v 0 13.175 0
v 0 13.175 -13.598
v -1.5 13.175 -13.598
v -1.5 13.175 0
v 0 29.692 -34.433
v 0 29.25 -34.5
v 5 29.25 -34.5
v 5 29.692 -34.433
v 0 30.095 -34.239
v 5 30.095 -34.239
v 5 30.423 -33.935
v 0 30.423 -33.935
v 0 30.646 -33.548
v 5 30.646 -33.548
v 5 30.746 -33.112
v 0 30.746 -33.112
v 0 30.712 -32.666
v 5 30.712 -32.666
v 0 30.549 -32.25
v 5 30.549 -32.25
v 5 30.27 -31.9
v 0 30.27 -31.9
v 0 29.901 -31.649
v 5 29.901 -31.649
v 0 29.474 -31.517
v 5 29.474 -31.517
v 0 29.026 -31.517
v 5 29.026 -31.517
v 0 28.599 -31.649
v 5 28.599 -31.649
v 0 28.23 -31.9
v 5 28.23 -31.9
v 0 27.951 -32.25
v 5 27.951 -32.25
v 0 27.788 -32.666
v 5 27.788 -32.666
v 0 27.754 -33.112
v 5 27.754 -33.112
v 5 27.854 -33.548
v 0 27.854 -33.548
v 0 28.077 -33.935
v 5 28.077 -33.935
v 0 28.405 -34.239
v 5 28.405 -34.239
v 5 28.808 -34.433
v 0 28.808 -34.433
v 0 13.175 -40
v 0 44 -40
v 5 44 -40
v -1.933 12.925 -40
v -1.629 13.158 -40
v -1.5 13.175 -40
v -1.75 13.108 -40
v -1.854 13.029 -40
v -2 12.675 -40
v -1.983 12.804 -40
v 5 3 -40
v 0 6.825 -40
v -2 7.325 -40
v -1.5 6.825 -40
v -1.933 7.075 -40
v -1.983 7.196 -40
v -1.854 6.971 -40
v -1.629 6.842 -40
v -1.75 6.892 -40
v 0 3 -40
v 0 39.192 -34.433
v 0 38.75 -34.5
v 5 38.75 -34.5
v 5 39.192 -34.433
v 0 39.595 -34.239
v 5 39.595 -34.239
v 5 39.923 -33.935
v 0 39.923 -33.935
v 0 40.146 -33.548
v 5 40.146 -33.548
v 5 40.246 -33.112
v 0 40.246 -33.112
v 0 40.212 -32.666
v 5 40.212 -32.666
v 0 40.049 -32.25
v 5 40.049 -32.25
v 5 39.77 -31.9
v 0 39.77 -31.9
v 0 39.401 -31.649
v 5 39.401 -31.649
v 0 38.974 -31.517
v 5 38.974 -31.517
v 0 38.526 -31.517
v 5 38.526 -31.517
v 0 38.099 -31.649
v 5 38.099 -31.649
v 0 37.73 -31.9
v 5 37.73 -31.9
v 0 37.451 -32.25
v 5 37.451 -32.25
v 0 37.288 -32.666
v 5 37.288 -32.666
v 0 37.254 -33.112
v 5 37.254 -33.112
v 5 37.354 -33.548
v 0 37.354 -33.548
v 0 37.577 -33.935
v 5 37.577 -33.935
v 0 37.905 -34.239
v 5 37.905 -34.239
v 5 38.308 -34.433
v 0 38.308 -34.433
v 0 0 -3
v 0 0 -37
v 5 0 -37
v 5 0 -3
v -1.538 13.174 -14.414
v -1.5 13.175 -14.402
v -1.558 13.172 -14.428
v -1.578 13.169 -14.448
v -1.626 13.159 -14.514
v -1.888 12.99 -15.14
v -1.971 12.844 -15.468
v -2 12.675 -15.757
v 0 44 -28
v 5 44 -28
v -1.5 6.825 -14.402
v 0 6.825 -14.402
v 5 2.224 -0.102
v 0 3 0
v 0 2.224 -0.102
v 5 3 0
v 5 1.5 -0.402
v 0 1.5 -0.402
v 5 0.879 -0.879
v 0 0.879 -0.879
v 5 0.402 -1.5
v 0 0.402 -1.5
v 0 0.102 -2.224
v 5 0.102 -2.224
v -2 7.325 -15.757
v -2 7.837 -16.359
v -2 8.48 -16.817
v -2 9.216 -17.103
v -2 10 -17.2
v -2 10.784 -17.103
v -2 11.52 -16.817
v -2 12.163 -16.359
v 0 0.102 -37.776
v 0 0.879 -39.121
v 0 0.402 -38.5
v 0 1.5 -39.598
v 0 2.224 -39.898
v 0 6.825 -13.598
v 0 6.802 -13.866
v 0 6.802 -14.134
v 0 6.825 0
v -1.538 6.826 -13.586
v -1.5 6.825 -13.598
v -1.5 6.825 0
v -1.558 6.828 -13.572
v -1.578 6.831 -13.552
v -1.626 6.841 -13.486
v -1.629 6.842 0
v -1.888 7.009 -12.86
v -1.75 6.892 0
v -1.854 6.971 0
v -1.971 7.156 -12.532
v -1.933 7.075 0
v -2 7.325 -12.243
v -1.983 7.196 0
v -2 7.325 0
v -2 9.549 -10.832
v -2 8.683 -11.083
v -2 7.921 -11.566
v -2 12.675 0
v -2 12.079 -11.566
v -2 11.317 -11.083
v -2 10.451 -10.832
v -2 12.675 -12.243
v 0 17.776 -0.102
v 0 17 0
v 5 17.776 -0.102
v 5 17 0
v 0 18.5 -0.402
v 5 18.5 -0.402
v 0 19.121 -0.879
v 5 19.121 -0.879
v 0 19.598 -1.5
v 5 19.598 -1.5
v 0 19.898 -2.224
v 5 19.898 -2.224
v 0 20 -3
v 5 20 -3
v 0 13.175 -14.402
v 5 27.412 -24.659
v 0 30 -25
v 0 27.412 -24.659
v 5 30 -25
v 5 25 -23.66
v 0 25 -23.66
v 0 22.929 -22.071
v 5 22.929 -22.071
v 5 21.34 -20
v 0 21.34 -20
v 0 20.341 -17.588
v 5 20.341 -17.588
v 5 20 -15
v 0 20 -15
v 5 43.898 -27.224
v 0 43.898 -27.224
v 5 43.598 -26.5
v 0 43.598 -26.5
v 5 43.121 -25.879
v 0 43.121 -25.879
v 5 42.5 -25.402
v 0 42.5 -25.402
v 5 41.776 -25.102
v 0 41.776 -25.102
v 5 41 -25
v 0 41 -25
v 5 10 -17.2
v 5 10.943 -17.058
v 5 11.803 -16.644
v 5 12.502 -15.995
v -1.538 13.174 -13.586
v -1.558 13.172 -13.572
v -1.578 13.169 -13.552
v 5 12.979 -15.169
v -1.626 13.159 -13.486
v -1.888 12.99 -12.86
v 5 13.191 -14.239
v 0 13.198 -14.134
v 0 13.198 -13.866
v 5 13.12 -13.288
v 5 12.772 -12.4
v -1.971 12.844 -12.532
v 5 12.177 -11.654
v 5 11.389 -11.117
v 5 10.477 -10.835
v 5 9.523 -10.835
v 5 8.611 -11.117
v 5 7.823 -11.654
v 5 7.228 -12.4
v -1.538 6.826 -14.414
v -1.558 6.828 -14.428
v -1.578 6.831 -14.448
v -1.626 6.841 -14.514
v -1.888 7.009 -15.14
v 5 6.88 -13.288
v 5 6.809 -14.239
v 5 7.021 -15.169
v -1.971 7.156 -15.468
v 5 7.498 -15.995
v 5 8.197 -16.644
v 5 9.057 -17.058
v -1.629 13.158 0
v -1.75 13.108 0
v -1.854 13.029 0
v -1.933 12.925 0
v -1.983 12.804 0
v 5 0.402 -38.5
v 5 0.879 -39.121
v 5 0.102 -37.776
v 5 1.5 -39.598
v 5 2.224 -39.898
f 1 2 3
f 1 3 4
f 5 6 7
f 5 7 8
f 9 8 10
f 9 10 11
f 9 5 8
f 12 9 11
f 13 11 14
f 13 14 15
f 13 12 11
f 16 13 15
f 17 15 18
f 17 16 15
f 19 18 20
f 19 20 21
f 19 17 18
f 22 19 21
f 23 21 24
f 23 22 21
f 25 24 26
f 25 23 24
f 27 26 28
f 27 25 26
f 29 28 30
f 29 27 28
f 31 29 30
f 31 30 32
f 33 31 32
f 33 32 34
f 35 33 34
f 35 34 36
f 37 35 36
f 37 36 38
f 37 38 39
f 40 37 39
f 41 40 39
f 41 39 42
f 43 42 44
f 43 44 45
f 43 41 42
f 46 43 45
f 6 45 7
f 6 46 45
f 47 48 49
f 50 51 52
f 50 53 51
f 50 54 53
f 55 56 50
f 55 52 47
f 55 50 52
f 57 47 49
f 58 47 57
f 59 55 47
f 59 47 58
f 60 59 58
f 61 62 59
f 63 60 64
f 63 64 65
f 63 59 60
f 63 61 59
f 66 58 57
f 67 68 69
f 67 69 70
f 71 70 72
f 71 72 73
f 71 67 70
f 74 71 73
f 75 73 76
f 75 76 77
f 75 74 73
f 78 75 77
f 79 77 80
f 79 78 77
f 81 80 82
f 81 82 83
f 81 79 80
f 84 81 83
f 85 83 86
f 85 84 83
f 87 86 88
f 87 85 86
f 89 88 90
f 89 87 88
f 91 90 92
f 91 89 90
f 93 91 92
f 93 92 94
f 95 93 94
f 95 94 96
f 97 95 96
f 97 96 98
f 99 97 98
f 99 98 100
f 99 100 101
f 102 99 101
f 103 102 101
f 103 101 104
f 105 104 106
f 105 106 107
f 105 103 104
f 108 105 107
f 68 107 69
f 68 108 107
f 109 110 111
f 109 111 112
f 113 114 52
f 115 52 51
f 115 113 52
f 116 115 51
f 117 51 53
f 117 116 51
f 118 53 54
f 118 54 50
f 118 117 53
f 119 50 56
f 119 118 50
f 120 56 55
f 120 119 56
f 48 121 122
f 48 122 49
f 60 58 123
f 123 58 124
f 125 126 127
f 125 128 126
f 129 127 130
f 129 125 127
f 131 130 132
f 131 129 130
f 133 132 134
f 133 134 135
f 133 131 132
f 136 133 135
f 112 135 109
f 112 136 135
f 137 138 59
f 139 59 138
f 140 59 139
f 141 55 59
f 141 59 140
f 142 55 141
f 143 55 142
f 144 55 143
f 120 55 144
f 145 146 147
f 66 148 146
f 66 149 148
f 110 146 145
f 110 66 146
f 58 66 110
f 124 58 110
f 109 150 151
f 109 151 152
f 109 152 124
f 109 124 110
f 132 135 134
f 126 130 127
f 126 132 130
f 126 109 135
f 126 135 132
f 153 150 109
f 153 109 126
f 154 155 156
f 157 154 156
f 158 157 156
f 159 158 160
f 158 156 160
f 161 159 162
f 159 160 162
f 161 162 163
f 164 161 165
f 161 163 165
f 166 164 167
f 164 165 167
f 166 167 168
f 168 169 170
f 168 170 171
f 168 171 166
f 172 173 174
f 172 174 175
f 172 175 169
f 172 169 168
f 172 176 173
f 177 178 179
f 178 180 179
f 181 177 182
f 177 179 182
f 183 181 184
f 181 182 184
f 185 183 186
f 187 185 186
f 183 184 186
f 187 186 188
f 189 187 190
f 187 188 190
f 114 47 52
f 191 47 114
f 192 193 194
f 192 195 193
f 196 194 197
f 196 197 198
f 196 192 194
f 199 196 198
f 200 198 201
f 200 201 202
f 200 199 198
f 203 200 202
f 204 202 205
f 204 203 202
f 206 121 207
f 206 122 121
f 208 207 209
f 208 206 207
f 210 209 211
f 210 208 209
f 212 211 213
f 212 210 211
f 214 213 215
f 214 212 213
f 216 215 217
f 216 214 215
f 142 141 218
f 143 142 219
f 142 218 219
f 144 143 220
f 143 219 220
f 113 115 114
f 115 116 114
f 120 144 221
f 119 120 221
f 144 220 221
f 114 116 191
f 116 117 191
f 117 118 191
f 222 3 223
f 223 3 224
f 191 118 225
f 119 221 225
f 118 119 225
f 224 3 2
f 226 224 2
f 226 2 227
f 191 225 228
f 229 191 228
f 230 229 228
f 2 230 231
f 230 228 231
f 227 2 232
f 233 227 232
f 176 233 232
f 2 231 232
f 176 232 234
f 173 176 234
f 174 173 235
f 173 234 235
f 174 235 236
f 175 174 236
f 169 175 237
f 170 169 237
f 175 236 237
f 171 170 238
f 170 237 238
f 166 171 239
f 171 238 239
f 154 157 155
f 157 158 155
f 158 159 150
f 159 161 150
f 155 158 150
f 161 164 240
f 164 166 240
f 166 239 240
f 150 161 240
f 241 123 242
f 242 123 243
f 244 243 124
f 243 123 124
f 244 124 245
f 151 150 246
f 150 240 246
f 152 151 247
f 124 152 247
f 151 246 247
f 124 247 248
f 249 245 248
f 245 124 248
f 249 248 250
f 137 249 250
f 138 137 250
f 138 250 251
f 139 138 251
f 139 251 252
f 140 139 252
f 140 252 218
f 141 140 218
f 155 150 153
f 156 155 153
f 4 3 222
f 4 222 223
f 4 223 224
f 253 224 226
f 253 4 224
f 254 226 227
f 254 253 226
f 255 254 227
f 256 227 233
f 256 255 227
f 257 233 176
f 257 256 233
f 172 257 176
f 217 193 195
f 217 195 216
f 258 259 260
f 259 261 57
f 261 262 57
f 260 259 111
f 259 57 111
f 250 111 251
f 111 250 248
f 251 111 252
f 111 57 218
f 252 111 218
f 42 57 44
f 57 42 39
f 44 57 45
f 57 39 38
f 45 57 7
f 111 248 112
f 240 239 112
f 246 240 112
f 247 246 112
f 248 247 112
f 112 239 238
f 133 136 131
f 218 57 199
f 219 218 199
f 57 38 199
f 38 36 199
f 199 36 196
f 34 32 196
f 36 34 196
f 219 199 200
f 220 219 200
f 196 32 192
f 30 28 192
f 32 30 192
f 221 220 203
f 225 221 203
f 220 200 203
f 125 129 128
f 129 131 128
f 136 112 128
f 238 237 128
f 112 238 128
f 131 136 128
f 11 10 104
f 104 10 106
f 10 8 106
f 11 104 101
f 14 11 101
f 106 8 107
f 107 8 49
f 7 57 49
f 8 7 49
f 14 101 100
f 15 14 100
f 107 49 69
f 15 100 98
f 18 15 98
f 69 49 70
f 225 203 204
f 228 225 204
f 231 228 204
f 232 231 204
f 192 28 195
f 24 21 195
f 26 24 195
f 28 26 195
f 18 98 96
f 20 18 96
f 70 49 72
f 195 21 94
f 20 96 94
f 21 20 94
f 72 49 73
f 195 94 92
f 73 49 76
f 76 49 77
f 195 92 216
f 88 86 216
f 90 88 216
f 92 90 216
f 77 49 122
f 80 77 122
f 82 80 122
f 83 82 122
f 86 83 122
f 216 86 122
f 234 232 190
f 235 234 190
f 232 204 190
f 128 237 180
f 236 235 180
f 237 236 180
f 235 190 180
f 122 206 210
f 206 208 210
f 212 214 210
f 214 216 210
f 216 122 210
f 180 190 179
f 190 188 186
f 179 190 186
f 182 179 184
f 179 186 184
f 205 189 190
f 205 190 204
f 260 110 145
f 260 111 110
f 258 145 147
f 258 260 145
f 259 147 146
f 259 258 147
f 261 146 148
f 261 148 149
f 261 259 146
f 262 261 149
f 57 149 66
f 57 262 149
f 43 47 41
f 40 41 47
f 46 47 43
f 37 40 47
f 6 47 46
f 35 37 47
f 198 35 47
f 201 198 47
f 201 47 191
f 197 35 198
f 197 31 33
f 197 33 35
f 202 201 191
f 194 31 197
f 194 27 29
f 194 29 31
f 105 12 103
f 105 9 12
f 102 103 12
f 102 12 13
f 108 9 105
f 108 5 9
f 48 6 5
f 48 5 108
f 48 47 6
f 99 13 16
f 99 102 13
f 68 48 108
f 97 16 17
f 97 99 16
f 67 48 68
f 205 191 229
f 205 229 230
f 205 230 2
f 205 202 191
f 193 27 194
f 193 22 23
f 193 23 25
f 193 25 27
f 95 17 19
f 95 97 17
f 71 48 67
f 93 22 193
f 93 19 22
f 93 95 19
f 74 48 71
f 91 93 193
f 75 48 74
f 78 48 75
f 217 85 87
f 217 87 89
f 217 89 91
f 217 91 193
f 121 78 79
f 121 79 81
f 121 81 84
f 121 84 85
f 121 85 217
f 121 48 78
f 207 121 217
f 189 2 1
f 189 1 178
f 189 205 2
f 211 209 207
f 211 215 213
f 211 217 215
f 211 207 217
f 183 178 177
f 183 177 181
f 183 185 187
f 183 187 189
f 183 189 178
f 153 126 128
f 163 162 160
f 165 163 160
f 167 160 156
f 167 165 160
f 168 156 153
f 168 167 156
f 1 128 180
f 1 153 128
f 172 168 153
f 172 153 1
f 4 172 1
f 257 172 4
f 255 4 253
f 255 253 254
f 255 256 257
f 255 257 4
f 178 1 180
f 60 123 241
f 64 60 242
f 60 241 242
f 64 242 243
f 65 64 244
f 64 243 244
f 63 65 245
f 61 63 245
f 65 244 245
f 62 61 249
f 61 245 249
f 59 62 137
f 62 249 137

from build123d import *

# Parameters (mm, degrees)
SKETCH1_R           = 1.5
BOSS_EXTRUDE1_DEPTH = 5
SKETCH3_W           = 40
SKETCH3_H           = 6.35
BOSS_EXTRUDE2_DEPTH = 2
FILLET1_R           = 0.5
FILLET2_R           = 3
SKETCH4_R           = 3.2004
CUT_EXTRUDE1_DEPTH  = 8
FILLET3_R           = 10


with BuildPart() as part:
    # Sketch1 → Boss-Extrude1 (new body)
    with BuildSketch(Plane(origin=(0, 0, 0), x_dir=(0, 0, -1), z_dir=(1, 0, 0))):
        Polygon((0, 0), (0, 20), (25, 20), (25, 44), (40, 44), (40, 0), align=None)
        with Locations((33, 38.75)):
            Circle(SKETCH1_R, mode=Mode.SUBTRACT)
        with Locations((33, 29.25)):
            Circle(SKETCH1_R, mode=Mode.SUBTRACT)
    extrude(amount=BOSS_EXTRUDE1_DEPTH)

    # Sketch3 → Boss-Extrude2 (add)
    with BuildSketch(Plane.ZY):
        with Locations((-20, 10)):
            Rectangle(SKETCH3_W, SKETCH3_H)
    extrude(amount=BOSS_EXTRUDE2_DEPTH)

    # Fillet1
    fillet1_edges = [part.edges().sort_by_distance(p)[0] for p in [
        (-2, 6.825, -20),
        (-2, 13.175, -20),
    ]]
    fillet(fillet1_edges, radius=FILLET1_R)

    # Fillet2
    fillet2_edges = [part.edges().sort_by_distance(p)[0] for p in [
        (2.5, 0, 0),
        (2.5, 20, 0),
        (2.5, 44, -25),
        (2.5, 0, -40),
    ]]
    fillet(fillet2_edges, radius=FILLET2_R)

    # Sketch4 → Cut-Extrude1 (cut, through all)
    with BuildSketch(Plane(origin=(5, 0, 0), x_dir=(0, 0, -1), z_dir=(1, 0, 0))):
        with Locations((14, 10)):
            Circle(SKETCH4_R)
    extrude(amount=-CUT_EXTRUDE1_DEPTH, mode=Mode.SUBTRACT)

    # Fillet3
    fillet3_edges = [part.edges().sort_by_distance(p)[0] for p in [
        (2.5, 20, -25),
    ]]
    fillet(fillet3_edges, radius=FILLET3_R)


solid = part.part
